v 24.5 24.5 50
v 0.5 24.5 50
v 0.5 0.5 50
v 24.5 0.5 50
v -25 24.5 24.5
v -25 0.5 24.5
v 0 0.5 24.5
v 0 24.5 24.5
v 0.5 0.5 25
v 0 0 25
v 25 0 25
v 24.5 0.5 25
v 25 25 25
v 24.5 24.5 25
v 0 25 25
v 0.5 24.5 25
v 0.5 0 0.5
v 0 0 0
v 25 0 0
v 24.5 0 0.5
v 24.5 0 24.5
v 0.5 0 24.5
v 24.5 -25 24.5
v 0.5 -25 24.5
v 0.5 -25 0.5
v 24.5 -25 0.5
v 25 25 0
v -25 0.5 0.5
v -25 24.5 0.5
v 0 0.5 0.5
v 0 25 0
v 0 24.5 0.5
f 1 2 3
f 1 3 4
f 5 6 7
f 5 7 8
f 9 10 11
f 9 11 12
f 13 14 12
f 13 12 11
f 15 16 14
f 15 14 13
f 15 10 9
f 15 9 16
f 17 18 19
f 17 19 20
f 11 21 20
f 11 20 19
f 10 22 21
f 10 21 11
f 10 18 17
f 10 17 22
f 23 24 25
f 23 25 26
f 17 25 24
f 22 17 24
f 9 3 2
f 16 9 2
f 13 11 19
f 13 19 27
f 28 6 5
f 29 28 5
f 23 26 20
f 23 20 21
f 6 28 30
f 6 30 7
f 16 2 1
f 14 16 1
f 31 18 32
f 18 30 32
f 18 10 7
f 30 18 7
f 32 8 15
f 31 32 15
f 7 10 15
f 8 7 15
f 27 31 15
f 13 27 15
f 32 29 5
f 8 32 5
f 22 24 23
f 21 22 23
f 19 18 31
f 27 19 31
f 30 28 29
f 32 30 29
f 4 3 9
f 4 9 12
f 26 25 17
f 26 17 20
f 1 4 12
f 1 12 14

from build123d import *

# Parameters (mm, degrees)
F0_W     = 25
F0_H     = 25
F1_DEPTH = 25
F2_W     = 24
F2_H     = 24
F3_DEPTH = 25
F4_W     = 24
F4_H     = 24
F5_DEPTH = 25
F6_W     = 24
F6_H     = 24
F7_DEPTH = 25


with BuildPart() as f1:
    # F0 (on Right) → F1 (new body)
    with BuildSketch(Plane.YZ):
        with Locations((12.5, 12.5)):
            Rectangle(F0_W, F0_H)
    extrude(amount=F1_DEPTH)

    # F2 (on Right) → F3 (join)
    with BuildSketch(Plane.YZ):
        with Locations((12.5, 12.5)):
            Rectangle(F2_W, F2_H)
    extrude(amount=-F3_DEPTH)

    # F4 (on face) → F5 (join)
    with BuildSketch(Plane.XZ):
        with Locations((12.5, 12.5)):
            Rectangle(F4_W, F4_H)
    extrude(amount=F5_DEPTH)

    # F6 (on face) → F7 (join)
    with BuildSketch(Plane.XY.offset(25)):
        with Locations((12.5, 12.5)):
            Rectangle(F6_W, F6_H)
    extrude(amount=F7_DEPTH)


solid = f1.part
